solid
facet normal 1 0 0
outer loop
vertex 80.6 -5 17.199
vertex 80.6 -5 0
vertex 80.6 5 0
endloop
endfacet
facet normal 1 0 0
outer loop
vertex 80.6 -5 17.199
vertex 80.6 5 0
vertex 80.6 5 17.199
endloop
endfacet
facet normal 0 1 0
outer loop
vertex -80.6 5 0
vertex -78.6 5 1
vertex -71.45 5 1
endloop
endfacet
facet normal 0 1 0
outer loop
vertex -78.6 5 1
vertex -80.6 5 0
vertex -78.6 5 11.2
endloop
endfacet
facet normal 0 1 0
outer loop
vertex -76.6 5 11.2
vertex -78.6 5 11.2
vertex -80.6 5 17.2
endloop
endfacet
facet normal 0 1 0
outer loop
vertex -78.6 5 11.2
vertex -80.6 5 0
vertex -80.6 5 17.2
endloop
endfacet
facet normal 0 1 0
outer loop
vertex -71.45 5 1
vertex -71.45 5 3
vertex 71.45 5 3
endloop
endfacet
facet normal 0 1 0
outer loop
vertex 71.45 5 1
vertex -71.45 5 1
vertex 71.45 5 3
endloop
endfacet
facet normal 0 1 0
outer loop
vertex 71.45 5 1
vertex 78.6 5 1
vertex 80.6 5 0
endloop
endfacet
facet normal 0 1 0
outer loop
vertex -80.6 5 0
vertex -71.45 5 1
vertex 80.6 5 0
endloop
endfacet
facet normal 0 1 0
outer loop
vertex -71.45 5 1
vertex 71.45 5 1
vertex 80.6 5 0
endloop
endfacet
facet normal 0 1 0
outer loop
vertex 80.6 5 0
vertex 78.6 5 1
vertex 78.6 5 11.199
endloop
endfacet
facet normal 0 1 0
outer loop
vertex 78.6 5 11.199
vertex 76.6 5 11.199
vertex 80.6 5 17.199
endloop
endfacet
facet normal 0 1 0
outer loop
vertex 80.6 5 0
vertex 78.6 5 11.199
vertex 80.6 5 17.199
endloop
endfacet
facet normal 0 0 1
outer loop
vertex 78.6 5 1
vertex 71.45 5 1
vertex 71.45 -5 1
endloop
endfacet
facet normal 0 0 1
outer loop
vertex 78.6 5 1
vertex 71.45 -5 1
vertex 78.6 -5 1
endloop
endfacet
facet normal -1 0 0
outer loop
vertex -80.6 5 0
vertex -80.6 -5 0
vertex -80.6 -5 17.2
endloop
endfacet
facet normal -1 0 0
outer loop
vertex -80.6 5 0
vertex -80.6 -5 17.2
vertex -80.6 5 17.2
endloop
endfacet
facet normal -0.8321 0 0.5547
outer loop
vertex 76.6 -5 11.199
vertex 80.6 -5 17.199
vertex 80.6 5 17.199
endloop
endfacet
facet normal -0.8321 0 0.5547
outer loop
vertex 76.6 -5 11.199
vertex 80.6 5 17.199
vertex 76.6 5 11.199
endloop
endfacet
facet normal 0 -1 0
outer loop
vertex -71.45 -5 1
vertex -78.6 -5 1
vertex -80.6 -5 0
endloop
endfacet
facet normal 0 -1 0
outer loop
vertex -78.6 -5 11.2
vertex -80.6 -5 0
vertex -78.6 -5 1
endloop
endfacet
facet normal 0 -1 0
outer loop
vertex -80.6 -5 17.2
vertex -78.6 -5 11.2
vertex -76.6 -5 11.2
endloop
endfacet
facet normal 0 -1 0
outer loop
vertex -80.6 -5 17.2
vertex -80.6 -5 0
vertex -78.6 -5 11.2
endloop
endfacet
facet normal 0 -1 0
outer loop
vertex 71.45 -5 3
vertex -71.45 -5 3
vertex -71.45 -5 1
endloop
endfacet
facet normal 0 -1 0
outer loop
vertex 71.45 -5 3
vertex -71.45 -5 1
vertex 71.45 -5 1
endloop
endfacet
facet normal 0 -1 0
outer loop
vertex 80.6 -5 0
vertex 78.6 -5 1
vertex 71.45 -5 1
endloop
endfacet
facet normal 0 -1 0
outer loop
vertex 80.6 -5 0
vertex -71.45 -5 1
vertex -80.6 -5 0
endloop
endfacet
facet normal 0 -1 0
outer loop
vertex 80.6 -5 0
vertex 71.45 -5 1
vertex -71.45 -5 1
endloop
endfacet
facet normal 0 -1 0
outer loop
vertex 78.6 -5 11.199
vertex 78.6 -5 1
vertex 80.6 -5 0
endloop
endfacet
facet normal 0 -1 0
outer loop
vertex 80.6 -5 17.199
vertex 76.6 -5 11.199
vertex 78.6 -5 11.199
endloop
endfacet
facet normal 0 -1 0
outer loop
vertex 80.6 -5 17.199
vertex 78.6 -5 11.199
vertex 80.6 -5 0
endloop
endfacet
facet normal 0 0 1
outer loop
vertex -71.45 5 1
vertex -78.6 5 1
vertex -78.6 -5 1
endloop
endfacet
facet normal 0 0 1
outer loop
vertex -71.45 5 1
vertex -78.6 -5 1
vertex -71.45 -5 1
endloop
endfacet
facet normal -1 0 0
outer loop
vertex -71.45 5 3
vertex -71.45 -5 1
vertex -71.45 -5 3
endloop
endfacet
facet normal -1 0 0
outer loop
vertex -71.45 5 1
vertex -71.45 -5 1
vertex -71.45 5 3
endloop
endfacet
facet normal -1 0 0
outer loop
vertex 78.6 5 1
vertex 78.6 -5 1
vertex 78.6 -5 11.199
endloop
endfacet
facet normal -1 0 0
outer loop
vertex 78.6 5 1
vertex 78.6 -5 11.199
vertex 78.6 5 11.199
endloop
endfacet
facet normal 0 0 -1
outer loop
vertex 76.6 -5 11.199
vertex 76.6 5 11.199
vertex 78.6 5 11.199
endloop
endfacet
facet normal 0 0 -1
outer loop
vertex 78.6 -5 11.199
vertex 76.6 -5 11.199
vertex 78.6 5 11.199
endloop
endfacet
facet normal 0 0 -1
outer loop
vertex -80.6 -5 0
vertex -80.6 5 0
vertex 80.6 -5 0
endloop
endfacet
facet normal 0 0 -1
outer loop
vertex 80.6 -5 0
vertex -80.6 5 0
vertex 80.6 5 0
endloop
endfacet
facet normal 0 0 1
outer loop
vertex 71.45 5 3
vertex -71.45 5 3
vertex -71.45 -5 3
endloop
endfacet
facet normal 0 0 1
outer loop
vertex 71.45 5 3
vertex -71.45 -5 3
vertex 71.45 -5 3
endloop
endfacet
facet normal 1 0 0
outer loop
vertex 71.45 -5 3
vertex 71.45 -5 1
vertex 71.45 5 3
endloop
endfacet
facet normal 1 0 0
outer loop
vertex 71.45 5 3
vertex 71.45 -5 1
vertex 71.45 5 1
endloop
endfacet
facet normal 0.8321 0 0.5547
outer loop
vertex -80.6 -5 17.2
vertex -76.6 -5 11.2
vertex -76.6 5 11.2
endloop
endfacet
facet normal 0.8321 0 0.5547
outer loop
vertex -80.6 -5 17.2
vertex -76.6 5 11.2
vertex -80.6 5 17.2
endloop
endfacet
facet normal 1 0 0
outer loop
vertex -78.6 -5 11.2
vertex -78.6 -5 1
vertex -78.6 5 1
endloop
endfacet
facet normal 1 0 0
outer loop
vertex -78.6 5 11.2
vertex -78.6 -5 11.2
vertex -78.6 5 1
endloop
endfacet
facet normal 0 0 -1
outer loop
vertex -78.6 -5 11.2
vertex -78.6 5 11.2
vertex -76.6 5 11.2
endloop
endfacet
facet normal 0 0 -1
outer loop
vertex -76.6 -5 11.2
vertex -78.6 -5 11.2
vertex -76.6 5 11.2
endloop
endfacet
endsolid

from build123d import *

# Parameters (mm, degrees)
F0_W     = 161.2
F0_H     = 10
F1_DEPTH = 1
F2_W     = 2
F2_H     = 10
F3_DEPTH = 10.2
F2_W_2   = 142.9
F4_DEPTH = 2
F6_DEPTH = 10


with BuildPart() as f1:
    # F0 (on Top) → F1 (new body)
    with BuildSketch(Plane.XY):
        Rectangle(F0_W, F0_H)
    extrude(amount=F1_DEPTH)

    # F2 (on face) → F3 (join)
    with BuildSketch(Plane.XY.offset(1)):
        with Locations((-79.6, 0)):
            Rectangle(F2_W, F2_H)
        with Locations((79.6, 0)):
            Rectangle(F2_W, F2_H)
    extrude(amount=F3_DEPTH)

    # F2 (on face) → F4 (join)
    with BuildSketch(Plane.XY.offset(1)):
        Rectangle(F2_W_2, F2_H)
    extrude(amount=F4_DEPTH)

    # F5 (on face) → F6 (join)
    with BuildSketch(Plane.XZ.offset(5)):
        Polygon((78.6, 11.2), (80.6, 11.2), (80.6, 17.199105), (76.6, 11.199105), (78.6, 11.199105), align=None)
        Polygon((-76.6, 11.2), (-80.6, 17.2), (-80.6, 11.2), (-78.6, 11.2), align=None)
    extrude(amount=-F6_DEPTH)


solid = f1.part
